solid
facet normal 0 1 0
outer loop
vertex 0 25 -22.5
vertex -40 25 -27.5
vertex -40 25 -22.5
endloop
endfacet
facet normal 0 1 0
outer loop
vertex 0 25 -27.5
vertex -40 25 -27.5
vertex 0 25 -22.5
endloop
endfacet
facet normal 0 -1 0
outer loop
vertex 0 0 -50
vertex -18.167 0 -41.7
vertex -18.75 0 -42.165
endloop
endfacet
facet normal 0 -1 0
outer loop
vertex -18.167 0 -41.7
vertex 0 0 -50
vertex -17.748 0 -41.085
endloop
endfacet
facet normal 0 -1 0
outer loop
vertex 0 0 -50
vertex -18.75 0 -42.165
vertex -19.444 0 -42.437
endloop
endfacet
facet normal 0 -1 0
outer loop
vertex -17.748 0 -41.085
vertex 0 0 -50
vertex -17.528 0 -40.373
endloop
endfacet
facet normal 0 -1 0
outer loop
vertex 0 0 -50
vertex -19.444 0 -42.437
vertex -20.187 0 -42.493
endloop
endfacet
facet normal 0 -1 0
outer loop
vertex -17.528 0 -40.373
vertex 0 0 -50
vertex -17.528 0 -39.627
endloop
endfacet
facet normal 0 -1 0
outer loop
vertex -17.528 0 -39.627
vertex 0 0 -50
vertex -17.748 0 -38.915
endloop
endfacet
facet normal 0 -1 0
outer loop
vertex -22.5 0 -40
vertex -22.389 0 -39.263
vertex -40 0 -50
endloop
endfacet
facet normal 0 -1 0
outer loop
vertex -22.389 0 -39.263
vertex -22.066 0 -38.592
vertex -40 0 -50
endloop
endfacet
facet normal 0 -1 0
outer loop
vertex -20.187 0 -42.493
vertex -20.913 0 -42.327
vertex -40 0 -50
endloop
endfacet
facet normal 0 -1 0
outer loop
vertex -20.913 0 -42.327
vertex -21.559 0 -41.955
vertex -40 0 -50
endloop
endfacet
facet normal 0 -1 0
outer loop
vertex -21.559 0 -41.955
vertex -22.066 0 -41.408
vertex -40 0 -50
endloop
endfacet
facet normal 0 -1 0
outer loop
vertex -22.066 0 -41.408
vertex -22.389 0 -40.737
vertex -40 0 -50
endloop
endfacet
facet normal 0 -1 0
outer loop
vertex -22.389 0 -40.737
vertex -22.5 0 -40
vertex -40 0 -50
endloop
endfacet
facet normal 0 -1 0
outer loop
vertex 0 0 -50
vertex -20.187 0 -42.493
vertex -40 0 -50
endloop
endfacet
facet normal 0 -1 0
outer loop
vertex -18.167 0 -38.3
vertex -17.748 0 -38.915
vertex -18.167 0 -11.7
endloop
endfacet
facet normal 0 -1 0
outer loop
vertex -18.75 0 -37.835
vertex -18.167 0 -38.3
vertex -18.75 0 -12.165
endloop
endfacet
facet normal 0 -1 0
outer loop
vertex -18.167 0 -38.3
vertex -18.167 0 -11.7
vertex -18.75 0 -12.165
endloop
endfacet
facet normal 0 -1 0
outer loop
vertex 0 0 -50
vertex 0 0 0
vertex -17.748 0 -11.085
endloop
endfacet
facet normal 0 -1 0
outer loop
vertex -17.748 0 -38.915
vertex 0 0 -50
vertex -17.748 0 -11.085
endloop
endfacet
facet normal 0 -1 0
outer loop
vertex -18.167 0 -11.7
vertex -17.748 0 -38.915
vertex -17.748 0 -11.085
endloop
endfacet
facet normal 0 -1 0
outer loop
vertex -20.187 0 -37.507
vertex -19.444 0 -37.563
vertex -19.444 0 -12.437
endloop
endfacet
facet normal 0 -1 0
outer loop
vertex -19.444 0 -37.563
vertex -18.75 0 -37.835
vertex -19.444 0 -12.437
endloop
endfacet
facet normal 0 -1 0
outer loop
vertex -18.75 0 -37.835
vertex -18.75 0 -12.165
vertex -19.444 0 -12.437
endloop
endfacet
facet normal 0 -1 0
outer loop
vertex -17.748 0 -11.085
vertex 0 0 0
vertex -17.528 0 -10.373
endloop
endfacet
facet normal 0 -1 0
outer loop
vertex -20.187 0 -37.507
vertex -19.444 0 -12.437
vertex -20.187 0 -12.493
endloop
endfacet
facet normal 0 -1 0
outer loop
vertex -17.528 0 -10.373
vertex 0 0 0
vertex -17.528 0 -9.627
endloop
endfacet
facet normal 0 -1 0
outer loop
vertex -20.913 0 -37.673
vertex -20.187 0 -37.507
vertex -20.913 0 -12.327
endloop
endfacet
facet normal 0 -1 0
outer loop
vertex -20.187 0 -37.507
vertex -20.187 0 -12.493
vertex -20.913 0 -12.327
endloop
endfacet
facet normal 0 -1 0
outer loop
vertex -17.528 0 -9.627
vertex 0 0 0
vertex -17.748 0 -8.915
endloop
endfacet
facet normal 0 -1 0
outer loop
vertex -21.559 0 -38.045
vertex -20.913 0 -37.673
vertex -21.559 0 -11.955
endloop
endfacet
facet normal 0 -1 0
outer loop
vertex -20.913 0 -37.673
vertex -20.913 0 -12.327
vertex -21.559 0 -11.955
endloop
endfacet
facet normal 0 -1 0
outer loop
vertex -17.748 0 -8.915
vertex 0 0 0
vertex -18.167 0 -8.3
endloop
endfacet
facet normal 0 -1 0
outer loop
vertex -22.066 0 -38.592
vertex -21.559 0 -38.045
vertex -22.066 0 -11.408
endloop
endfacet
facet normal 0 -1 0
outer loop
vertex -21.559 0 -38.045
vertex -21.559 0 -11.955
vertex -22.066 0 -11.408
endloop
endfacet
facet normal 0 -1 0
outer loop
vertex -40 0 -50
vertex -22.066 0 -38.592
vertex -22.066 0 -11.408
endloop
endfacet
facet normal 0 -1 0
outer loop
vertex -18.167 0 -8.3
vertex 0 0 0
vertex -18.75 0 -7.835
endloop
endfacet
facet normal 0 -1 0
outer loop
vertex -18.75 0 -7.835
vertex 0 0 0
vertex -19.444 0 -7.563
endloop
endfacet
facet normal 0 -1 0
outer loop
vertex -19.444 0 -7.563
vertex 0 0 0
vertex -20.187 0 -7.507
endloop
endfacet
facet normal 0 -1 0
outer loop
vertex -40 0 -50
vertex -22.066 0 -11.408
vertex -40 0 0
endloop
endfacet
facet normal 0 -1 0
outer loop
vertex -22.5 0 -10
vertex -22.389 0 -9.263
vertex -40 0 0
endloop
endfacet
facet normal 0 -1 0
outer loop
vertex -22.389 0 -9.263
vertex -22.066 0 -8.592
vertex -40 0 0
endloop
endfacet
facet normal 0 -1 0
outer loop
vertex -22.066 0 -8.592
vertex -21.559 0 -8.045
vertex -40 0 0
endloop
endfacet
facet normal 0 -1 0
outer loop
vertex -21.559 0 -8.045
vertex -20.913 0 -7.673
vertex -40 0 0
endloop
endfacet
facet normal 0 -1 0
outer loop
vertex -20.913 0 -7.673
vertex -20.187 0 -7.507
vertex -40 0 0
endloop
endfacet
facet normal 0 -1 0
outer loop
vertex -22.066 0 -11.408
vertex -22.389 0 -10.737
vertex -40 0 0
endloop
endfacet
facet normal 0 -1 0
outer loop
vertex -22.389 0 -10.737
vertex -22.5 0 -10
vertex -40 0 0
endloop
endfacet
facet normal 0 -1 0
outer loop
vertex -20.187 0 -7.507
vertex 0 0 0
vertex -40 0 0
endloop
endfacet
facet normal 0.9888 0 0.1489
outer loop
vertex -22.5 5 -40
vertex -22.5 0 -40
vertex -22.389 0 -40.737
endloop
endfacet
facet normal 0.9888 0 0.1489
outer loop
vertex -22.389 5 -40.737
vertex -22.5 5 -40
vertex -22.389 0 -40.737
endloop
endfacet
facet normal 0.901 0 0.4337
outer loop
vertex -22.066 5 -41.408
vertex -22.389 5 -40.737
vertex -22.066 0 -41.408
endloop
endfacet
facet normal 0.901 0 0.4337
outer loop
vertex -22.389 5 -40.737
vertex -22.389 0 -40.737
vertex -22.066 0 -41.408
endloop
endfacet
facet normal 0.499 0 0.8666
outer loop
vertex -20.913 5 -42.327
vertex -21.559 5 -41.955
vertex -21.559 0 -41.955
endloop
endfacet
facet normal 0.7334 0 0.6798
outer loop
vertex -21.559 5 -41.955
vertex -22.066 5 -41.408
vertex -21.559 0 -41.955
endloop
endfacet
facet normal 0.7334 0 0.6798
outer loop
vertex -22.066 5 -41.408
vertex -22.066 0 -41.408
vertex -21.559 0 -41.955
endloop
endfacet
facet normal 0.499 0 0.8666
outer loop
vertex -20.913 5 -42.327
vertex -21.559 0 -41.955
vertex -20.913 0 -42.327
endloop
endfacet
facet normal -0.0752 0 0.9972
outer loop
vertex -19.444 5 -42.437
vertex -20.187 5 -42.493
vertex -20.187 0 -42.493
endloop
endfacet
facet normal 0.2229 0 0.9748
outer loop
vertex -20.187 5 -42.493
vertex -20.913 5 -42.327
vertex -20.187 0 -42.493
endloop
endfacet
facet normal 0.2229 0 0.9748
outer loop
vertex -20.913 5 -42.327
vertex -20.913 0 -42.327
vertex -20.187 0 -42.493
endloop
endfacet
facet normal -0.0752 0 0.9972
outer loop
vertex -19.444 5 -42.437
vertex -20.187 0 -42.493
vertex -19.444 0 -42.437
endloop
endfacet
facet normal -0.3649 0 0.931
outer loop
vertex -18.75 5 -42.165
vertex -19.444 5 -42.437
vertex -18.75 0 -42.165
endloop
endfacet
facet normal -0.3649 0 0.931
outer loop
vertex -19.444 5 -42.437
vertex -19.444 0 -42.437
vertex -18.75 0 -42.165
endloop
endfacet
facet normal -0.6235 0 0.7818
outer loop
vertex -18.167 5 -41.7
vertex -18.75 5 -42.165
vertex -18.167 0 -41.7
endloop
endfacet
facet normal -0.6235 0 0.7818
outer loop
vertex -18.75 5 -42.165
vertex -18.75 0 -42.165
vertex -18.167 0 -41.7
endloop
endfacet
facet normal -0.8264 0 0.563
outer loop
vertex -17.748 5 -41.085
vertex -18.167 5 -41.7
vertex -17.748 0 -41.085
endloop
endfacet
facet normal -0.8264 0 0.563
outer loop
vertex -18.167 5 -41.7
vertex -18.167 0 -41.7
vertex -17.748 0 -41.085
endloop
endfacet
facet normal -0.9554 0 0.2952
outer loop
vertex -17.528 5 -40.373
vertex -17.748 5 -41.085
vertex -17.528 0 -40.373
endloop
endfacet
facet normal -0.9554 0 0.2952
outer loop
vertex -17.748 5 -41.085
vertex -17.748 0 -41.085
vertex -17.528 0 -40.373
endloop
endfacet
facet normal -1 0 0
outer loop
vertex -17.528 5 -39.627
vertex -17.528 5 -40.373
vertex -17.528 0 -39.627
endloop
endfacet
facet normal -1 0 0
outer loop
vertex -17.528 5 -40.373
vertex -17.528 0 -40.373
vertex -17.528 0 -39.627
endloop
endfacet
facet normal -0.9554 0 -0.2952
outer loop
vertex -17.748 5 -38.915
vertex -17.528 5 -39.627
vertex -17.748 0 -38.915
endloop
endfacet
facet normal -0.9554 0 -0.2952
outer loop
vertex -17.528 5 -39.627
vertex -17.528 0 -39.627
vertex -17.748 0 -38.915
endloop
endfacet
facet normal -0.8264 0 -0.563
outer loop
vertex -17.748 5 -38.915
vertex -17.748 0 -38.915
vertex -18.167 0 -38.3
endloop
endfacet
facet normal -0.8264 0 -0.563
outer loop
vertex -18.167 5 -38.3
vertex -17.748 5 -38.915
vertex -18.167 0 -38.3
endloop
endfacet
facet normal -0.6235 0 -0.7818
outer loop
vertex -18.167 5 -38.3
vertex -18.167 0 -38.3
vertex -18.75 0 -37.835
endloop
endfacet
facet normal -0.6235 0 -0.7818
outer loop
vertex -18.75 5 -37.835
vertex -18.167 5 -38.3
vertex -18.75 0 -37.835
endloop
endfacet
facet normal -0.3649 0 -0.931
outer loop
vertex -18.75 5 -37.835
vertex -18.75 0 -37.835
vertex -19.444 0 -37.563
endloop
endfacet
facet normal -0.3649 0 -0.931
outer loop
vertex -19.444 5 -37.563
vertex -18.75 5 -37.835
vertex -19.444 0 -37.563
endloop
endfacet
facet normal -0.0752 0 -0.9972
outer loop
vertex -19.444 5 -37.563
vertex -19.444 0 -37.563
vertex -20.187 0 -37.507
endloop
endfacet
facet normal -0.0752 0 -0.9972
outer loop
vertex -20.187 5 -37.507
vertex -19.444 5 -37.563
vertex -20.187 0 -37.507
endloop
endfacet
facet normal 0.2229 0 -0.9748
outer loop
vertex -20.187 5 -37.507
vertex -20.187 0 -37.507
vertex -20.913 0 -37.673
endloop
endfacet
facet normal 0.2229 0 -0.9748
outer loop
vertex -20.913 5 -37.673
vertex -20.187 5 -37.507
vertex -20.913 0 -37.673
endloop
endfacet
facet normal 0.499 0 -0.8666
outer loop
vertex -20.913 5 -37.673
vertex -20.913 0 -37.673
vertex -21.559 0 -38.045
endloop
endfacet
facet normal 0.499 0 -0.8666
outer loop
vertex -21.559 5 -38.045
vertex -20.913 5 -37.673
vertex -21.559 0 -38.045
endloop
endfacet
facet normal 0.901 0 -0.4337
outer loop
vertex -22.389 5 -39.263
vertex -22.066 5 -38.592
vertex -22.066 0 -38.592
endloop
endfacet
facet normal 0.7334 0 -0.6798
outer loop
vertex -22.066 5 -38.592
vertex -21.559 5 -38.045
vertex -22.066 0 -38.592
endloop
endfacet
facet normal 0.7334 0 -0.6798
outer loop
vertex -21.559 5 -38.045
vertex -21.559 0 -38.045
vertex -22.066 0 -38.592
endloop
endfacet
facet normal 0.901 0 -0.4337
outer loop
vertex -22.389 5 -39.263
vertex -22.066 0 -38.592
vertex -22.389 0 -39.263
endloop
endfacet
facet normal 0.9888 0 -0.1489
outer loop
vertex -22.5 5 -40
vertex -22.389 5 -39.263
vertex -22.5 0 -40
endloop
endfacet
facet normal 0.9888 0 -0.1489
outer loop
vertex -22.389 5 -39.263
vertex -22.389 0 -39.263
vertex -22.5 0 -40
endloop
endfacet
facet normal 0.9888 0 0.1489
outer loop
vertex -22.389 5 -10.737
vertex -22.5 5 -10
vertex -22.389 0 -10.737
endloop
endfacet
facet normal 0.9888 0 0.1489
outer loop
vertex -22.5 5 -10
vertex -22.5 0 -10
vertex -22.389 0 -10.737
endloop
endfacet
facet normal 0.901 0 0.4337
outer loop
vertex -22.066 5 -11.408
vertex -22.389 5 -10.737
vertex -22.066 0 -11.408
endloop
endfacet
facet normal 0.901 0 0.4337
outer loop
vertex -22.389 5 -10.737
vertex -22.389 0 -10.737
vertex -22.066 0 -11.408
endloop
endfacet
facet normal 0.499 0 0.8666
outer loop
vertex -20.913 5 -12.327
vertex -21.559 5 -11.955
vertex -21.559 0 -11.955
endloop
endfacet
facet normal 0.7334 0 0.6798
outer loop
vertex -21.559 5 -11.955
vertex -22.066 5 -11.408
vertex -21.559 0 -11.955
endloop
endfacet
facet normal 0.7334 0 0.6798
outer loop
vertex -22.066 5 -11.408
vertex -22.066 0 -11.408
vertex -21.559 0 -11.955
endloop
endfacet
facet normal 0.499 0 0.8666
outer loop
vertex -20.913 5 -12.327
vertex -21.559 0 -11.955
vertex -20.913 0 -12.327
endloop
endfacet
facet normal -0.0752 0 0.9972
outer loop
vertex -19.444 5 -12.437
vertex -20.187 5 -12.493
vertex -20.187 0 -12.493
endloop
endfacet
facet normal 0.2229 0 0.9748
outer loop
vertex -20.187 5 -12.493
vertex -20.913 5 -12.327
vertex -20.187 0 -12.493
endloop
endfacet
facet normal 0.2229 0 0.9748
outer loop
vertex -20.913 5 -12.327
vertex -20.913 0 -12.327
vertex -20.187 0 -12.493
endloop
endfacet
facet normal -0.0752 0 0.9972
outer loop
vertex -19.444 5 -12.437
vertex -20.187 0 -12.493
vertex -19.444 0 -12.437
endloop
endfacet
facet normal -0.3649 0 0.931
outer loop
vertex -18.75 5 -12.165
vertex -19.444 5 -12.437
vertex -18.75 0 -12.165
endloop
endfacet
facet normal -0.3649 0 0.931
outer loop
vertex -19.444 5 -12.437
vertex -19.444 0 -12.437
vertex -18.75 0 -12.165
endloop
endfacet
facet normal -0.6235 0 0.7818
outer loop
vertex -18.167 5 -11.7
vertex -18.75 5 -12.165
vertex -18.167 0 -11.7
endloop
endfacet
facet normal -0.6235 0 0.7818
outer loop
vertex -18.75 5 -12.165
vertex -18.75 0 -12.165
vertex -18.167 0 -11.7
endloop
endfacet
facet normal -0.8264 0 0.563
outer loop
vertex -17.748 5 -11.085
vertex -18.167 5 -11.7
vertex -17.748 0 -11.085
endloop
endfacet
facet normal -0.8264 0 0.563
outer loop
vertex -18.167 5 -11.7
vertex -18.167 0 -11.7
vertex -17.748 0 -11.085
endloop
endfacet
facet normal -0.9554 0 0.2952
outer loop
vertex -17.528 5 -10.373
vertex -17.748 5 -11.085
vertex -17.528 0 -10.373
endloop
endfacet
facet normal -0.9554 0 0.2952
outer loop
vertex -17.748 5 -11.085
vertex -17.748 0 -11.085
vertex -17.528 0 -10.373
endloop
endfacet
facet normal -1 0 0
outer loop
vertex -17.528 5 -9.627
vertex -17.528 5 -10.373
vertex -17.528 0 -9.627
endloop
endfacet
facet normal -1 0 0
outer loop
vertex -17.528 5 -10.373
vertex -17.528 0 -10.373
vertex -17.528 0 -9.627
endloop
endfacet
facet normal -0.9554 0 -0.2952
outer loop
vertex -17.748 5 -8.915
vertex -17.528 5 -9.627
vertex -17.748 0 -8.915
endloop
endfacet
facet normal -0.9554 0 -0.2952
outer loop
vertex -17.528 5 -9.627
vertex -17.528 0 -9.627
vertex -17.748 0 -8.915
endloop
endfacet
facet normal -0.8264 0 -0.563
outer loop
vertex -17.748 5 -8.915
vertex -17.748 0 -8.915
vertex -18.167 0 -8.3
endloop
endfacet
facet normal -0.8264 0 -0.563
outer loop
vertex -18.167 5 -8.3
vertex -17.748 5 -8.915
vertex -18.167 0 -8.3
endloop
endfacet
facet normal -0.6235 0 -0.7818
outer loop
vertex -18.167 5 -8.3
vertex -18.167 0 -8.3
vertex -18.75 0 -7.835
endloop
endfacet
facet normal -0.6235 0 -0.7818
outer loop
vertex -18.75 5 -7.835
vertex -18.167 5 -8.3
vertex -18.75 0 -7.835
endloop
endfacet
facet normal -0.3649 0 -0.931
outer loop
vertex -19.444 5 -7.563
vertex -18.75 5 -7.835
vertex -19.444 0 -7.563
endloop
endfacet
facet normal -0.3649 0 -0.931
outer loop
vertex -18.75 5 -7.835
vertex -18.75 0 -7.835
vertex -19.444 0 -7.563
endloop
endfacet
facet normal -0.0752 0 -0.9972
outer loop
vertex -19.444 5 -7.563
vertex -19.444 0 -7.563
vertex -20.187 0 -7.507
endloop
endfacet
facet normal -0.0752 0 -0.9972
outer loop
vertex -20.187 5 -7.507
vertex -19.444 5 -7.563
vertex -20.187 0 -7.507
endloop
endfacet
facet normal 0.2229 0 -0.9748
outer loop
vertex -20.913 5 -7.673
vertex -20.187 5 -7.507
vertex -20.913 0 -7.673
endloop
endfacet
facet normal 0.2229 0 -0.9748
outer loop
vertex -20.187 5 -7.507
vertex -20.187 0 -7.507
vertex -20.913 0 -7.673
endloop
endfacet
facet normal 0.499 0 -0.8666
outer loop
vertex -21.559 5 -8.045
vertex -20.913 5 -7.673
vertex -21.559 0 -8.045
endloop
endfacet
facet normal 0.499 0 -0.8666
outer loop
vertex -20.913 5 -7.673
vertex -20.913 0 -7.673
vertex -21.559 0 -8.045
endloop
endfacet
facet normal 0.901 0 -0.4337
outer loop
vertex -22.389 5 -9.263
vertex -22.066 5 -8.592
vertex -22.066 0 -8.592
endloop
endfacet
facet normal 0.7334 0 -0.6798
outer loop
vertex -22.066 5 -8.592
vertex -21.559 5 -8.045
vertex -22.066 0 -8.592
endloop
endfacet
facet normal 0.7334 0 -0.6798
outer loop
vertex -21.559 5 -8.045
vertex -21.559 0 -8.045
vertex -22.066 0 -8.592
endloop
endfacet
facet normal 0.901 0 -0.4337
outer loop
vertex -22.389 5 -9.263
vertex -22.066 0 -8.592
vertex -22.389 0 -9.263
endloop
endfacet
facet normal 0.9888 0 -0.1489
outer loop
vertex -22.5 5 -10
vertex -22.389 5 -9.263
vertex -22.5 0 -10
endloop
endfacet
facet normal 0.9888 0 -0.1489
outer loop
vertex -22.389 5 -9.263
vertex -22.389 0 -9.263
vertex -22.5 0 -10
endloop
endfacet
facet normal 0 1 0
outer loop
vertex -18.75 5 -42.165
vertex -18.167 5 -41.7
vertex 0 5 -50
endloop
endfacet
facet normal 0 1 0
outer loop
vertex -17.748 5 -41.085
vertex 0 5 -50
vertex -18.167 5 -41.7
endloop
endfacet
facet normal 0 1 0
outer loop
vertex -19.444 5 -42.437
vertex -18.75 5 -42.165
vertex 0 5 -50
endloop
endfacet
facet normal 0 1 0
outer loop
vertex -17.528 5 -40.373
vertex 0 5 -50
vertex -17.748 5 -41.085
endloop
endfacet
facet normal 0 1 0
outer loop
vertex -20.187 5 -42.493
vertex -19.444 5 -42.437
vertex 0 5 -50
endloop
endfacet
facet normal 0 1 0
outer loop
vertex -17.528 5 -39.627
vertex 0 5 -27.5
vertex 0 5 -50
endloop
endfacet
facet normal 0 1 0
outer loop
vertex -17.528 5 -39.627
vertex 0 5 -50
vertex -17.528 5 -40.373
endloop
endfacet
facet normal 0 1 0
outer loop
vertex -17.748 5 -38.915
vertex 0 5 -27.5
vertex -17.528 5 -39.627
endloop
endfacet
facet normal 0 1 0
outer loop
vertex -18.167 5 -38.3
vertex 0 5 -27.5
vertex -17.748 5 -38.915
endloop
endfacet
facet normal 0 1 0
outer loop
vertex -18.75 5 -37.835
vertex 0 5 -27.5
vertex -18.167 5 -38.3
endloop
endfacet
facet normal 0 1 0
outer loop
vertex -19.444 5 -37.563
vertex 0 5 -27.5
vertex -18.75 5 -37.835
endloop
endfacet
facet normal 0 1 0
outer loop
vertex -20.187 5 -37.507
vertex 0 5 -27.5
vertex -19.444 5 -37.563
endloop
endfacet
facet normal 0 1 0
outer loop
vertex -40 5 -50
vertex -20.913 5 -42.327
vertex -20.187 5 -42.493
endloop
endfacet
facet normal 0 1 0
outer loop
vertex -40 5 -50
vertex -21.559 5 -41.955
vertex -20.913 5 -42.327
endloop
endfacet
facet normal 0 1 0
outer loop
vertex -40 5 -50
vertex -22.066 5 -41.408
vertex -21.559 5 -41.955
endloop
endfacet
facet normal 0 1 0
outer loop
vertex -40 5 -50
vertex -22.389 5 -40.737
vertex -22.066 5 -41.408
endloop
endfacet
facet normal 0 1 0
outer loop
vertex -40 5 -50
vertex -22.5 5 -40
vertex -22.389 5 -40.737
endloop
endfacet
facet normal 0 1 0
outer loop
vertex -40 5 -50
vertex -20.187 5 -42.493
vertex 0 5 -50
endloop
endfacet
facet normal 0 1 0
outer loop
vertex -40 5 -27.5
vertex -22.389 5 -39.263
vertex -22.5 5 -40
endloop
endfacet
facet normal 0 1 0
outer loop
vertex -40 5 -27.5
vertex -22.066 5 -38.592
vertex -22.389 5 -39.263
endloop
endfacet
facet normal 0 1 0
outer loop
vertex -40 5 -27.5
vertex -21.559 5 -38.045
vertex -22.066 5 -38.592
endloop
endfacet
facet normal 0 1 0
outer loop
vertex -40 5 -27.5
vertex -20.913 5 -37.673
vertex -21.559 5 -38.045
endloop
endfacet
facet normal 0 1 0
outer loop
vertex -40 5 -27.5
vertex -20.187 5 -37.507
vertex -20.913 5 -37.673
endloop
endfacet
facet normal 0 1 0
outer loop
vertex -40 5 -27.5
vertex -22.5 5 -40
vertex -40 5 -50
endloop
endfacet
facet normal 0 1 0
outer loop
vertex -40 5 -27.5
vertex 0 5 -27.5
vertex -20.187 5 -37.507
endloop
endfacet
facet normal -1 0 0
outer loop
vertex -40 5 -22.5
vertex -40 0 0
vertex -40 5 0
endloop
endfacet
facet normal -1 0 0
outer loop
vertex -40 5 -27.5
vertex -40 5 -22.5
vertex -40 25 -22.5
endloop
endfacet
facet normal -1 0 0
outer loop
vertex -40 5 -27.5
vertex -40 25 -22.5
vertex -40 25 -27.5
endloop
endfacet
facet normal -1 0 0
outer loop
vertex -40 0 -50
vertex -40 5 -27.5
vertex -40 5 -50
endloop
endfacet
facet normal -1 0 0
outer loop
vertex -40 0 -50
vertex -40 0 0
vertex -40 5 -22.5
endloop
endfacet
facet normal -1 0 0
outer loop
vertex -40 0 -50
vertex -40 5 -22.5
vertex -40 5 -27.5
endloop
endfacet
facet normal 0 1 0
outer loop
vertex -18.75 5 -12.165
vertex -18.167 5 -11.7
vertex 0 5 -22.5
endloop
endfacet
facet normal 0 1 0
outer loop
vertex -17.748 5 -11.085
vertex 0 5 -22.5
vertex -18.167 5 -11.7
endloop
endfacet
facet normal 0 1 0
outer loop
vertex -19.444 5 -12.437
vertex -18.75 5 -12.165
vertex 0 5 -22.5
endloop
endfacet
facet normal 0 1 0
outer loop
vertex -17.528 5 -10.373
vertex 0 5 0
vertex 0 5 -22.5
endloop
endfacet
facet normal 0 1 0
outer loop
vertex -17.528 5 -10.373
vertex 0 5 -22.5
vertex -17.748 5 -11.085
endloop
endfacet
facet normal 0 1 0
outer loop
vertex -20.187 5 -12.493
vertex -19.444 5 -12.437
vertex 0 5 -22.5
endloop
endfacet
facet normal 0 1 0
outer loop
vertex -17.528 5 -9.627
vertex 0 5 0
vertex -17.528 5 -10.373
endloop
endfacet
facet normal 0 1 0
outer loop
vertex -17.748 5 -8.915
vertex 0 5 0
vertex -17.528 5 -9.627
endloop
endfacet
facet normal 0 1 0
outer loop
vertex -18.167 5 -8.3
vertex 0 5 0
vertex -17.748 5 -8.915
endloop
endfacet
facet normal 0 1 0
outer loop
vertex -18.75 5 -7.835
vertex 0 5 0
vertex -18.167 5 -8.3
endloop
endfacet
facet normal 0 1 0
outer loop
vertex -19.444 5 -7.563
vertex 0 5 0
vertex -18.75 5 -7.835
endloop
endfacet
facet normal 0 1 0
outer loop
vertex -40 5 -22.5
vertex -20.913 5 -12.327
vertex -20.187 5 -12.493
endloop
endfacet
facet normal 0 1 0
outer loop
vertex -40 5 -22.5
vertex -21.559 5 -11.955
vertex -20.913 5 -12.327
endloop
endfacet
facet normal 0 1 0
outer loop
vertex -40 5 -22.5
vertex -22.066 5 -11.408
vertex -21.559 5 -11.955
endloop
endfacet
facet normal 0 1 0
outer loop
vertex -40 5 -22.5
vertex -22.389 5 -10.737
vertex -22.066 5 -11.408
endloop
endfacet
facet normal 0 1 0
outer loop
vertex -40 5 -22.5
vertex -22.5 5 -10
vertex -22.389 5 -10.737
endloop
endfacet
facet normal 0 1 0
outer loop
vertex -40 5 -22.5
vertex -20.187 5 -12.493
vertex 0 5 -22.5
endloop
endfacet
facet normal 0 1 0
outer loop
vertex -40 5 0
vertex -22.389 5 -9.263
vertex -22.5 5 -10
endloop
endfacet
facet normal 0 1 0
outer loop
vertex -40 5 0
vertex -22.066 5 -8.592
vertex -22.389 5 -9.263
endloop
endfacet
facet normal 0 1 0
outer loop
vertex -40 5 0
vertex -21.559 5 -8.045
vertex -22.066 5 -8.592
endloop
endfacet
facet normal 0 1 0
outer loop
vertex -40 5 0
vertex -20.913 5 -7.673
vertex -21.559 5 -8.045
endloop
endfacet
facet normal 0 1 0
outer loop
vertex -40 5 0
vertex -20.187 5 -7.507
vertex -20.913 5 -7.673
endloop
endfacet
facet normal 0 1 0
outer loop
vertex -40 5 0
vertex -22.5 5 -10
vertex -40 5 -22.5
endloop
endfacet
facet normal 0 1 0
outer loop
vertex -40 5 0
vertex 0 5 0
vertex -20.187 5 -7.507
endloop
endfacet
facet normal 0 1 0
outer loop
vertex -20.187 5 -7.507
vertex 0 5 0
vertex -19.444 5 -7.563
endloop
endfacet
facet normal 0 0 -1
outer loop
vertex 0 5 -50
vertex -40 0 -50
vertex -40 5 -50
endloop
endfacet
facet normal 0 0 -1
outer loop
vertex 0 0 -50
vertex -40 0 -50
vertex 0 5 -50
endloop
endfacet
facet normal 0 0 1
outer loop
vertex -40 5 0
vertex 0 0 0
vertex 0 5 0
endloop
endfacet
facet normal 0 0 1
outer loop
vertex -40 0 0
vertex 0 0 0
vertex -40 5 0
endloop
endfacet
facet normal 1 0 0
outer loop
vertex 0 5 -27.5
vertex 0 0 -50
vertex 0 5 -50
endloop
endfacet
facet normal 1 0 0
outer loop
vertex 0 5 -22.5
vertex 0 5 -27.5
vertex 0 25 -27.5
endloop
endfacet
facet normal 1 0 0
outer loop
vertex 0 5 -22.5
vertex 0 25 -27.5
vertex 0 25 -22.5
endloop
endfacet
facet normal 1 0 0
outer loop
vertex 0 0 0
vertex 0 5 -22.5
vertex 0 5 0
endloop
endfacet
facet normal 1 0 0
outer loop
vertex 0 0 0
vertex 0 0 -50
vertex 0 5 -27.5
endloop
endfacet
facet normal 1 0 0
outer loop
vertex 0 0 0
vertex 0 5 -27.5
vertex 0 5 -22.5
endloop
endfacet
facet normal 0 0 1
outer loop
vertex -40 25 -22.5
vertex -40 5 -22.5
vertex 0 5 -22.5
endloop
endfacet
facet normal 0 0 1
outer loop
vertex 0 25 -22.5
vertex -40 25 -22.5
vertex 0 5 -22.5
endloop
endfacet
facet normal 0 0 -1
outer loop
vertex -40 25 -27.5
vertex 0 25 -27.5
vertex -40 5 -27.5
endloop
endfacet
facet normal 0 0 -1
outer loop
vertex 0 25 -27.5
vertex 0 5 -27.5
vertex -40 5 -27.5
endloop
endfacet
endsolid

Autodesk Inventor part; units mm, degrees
ref_plane "YZ Plane" through (0, 0, 0) normal (1, 0, 0) x (0, 1, 0)
ref_plane "XZ Plane" through (0, 0, 0) normal (0, 1, 0) x (-1, 0, 0)
ref_plane "XY Plane" through (0, 0, 0) normal (0, 0, 1) x (1, 0, 0)
sketch "Sketch1" plane through (0, 0, 0) normal (0, 1, 0) x (-1, 0, 0)
  line L0 (0, 0) -> (40, 0)
  line L1 (40, 0) -> (40, -50)
  line L2 (40, -50) -> (0, -50)
  line L3 (0, -50) -> (0, 0)
  circle A0 centre (20, -10) radius 2.5
  circle A1 centre (20, -40) radius 2.5
  dimension "d0" = 40
  dimension "d1" = 50
  dimension "d2" = 5
  dimension "d3" = 5
  dimension "d4" = 10
  dimension "d5" = 10
  dimension "d6" = 20
extrude "Extrusion1" add sketch "Sketch1" along normal blind 5
sketch "Sketch2" plane through (0, 5, 0) normal (0, 1, 0) x (1, 0, 0)
  line L0 (-40, 50) -> (-40, 0) projected
  line L1 (0, 0) -> (0, 50) projected
  line L2 (-40, 22.5) -> (0, 22.5)
  line L3 (0, 22.5) -> (0, 27.5)
  line L4 (0, 27.5) -> (-40, 27.5)
  line L5 (-40, 27.5) -> (-40, 22.5)
  line L6 (-40, 0) -> (0, 0) projected
  point P0 (0, 22.5)
  dimension "d9" = 5
  dimension "d10" = 22.5
extrude "Extrusion2" add sketch "Sketch2" along normal blind 20 contours L4 L1 L2 L0
properties part number "LightSensor01"
